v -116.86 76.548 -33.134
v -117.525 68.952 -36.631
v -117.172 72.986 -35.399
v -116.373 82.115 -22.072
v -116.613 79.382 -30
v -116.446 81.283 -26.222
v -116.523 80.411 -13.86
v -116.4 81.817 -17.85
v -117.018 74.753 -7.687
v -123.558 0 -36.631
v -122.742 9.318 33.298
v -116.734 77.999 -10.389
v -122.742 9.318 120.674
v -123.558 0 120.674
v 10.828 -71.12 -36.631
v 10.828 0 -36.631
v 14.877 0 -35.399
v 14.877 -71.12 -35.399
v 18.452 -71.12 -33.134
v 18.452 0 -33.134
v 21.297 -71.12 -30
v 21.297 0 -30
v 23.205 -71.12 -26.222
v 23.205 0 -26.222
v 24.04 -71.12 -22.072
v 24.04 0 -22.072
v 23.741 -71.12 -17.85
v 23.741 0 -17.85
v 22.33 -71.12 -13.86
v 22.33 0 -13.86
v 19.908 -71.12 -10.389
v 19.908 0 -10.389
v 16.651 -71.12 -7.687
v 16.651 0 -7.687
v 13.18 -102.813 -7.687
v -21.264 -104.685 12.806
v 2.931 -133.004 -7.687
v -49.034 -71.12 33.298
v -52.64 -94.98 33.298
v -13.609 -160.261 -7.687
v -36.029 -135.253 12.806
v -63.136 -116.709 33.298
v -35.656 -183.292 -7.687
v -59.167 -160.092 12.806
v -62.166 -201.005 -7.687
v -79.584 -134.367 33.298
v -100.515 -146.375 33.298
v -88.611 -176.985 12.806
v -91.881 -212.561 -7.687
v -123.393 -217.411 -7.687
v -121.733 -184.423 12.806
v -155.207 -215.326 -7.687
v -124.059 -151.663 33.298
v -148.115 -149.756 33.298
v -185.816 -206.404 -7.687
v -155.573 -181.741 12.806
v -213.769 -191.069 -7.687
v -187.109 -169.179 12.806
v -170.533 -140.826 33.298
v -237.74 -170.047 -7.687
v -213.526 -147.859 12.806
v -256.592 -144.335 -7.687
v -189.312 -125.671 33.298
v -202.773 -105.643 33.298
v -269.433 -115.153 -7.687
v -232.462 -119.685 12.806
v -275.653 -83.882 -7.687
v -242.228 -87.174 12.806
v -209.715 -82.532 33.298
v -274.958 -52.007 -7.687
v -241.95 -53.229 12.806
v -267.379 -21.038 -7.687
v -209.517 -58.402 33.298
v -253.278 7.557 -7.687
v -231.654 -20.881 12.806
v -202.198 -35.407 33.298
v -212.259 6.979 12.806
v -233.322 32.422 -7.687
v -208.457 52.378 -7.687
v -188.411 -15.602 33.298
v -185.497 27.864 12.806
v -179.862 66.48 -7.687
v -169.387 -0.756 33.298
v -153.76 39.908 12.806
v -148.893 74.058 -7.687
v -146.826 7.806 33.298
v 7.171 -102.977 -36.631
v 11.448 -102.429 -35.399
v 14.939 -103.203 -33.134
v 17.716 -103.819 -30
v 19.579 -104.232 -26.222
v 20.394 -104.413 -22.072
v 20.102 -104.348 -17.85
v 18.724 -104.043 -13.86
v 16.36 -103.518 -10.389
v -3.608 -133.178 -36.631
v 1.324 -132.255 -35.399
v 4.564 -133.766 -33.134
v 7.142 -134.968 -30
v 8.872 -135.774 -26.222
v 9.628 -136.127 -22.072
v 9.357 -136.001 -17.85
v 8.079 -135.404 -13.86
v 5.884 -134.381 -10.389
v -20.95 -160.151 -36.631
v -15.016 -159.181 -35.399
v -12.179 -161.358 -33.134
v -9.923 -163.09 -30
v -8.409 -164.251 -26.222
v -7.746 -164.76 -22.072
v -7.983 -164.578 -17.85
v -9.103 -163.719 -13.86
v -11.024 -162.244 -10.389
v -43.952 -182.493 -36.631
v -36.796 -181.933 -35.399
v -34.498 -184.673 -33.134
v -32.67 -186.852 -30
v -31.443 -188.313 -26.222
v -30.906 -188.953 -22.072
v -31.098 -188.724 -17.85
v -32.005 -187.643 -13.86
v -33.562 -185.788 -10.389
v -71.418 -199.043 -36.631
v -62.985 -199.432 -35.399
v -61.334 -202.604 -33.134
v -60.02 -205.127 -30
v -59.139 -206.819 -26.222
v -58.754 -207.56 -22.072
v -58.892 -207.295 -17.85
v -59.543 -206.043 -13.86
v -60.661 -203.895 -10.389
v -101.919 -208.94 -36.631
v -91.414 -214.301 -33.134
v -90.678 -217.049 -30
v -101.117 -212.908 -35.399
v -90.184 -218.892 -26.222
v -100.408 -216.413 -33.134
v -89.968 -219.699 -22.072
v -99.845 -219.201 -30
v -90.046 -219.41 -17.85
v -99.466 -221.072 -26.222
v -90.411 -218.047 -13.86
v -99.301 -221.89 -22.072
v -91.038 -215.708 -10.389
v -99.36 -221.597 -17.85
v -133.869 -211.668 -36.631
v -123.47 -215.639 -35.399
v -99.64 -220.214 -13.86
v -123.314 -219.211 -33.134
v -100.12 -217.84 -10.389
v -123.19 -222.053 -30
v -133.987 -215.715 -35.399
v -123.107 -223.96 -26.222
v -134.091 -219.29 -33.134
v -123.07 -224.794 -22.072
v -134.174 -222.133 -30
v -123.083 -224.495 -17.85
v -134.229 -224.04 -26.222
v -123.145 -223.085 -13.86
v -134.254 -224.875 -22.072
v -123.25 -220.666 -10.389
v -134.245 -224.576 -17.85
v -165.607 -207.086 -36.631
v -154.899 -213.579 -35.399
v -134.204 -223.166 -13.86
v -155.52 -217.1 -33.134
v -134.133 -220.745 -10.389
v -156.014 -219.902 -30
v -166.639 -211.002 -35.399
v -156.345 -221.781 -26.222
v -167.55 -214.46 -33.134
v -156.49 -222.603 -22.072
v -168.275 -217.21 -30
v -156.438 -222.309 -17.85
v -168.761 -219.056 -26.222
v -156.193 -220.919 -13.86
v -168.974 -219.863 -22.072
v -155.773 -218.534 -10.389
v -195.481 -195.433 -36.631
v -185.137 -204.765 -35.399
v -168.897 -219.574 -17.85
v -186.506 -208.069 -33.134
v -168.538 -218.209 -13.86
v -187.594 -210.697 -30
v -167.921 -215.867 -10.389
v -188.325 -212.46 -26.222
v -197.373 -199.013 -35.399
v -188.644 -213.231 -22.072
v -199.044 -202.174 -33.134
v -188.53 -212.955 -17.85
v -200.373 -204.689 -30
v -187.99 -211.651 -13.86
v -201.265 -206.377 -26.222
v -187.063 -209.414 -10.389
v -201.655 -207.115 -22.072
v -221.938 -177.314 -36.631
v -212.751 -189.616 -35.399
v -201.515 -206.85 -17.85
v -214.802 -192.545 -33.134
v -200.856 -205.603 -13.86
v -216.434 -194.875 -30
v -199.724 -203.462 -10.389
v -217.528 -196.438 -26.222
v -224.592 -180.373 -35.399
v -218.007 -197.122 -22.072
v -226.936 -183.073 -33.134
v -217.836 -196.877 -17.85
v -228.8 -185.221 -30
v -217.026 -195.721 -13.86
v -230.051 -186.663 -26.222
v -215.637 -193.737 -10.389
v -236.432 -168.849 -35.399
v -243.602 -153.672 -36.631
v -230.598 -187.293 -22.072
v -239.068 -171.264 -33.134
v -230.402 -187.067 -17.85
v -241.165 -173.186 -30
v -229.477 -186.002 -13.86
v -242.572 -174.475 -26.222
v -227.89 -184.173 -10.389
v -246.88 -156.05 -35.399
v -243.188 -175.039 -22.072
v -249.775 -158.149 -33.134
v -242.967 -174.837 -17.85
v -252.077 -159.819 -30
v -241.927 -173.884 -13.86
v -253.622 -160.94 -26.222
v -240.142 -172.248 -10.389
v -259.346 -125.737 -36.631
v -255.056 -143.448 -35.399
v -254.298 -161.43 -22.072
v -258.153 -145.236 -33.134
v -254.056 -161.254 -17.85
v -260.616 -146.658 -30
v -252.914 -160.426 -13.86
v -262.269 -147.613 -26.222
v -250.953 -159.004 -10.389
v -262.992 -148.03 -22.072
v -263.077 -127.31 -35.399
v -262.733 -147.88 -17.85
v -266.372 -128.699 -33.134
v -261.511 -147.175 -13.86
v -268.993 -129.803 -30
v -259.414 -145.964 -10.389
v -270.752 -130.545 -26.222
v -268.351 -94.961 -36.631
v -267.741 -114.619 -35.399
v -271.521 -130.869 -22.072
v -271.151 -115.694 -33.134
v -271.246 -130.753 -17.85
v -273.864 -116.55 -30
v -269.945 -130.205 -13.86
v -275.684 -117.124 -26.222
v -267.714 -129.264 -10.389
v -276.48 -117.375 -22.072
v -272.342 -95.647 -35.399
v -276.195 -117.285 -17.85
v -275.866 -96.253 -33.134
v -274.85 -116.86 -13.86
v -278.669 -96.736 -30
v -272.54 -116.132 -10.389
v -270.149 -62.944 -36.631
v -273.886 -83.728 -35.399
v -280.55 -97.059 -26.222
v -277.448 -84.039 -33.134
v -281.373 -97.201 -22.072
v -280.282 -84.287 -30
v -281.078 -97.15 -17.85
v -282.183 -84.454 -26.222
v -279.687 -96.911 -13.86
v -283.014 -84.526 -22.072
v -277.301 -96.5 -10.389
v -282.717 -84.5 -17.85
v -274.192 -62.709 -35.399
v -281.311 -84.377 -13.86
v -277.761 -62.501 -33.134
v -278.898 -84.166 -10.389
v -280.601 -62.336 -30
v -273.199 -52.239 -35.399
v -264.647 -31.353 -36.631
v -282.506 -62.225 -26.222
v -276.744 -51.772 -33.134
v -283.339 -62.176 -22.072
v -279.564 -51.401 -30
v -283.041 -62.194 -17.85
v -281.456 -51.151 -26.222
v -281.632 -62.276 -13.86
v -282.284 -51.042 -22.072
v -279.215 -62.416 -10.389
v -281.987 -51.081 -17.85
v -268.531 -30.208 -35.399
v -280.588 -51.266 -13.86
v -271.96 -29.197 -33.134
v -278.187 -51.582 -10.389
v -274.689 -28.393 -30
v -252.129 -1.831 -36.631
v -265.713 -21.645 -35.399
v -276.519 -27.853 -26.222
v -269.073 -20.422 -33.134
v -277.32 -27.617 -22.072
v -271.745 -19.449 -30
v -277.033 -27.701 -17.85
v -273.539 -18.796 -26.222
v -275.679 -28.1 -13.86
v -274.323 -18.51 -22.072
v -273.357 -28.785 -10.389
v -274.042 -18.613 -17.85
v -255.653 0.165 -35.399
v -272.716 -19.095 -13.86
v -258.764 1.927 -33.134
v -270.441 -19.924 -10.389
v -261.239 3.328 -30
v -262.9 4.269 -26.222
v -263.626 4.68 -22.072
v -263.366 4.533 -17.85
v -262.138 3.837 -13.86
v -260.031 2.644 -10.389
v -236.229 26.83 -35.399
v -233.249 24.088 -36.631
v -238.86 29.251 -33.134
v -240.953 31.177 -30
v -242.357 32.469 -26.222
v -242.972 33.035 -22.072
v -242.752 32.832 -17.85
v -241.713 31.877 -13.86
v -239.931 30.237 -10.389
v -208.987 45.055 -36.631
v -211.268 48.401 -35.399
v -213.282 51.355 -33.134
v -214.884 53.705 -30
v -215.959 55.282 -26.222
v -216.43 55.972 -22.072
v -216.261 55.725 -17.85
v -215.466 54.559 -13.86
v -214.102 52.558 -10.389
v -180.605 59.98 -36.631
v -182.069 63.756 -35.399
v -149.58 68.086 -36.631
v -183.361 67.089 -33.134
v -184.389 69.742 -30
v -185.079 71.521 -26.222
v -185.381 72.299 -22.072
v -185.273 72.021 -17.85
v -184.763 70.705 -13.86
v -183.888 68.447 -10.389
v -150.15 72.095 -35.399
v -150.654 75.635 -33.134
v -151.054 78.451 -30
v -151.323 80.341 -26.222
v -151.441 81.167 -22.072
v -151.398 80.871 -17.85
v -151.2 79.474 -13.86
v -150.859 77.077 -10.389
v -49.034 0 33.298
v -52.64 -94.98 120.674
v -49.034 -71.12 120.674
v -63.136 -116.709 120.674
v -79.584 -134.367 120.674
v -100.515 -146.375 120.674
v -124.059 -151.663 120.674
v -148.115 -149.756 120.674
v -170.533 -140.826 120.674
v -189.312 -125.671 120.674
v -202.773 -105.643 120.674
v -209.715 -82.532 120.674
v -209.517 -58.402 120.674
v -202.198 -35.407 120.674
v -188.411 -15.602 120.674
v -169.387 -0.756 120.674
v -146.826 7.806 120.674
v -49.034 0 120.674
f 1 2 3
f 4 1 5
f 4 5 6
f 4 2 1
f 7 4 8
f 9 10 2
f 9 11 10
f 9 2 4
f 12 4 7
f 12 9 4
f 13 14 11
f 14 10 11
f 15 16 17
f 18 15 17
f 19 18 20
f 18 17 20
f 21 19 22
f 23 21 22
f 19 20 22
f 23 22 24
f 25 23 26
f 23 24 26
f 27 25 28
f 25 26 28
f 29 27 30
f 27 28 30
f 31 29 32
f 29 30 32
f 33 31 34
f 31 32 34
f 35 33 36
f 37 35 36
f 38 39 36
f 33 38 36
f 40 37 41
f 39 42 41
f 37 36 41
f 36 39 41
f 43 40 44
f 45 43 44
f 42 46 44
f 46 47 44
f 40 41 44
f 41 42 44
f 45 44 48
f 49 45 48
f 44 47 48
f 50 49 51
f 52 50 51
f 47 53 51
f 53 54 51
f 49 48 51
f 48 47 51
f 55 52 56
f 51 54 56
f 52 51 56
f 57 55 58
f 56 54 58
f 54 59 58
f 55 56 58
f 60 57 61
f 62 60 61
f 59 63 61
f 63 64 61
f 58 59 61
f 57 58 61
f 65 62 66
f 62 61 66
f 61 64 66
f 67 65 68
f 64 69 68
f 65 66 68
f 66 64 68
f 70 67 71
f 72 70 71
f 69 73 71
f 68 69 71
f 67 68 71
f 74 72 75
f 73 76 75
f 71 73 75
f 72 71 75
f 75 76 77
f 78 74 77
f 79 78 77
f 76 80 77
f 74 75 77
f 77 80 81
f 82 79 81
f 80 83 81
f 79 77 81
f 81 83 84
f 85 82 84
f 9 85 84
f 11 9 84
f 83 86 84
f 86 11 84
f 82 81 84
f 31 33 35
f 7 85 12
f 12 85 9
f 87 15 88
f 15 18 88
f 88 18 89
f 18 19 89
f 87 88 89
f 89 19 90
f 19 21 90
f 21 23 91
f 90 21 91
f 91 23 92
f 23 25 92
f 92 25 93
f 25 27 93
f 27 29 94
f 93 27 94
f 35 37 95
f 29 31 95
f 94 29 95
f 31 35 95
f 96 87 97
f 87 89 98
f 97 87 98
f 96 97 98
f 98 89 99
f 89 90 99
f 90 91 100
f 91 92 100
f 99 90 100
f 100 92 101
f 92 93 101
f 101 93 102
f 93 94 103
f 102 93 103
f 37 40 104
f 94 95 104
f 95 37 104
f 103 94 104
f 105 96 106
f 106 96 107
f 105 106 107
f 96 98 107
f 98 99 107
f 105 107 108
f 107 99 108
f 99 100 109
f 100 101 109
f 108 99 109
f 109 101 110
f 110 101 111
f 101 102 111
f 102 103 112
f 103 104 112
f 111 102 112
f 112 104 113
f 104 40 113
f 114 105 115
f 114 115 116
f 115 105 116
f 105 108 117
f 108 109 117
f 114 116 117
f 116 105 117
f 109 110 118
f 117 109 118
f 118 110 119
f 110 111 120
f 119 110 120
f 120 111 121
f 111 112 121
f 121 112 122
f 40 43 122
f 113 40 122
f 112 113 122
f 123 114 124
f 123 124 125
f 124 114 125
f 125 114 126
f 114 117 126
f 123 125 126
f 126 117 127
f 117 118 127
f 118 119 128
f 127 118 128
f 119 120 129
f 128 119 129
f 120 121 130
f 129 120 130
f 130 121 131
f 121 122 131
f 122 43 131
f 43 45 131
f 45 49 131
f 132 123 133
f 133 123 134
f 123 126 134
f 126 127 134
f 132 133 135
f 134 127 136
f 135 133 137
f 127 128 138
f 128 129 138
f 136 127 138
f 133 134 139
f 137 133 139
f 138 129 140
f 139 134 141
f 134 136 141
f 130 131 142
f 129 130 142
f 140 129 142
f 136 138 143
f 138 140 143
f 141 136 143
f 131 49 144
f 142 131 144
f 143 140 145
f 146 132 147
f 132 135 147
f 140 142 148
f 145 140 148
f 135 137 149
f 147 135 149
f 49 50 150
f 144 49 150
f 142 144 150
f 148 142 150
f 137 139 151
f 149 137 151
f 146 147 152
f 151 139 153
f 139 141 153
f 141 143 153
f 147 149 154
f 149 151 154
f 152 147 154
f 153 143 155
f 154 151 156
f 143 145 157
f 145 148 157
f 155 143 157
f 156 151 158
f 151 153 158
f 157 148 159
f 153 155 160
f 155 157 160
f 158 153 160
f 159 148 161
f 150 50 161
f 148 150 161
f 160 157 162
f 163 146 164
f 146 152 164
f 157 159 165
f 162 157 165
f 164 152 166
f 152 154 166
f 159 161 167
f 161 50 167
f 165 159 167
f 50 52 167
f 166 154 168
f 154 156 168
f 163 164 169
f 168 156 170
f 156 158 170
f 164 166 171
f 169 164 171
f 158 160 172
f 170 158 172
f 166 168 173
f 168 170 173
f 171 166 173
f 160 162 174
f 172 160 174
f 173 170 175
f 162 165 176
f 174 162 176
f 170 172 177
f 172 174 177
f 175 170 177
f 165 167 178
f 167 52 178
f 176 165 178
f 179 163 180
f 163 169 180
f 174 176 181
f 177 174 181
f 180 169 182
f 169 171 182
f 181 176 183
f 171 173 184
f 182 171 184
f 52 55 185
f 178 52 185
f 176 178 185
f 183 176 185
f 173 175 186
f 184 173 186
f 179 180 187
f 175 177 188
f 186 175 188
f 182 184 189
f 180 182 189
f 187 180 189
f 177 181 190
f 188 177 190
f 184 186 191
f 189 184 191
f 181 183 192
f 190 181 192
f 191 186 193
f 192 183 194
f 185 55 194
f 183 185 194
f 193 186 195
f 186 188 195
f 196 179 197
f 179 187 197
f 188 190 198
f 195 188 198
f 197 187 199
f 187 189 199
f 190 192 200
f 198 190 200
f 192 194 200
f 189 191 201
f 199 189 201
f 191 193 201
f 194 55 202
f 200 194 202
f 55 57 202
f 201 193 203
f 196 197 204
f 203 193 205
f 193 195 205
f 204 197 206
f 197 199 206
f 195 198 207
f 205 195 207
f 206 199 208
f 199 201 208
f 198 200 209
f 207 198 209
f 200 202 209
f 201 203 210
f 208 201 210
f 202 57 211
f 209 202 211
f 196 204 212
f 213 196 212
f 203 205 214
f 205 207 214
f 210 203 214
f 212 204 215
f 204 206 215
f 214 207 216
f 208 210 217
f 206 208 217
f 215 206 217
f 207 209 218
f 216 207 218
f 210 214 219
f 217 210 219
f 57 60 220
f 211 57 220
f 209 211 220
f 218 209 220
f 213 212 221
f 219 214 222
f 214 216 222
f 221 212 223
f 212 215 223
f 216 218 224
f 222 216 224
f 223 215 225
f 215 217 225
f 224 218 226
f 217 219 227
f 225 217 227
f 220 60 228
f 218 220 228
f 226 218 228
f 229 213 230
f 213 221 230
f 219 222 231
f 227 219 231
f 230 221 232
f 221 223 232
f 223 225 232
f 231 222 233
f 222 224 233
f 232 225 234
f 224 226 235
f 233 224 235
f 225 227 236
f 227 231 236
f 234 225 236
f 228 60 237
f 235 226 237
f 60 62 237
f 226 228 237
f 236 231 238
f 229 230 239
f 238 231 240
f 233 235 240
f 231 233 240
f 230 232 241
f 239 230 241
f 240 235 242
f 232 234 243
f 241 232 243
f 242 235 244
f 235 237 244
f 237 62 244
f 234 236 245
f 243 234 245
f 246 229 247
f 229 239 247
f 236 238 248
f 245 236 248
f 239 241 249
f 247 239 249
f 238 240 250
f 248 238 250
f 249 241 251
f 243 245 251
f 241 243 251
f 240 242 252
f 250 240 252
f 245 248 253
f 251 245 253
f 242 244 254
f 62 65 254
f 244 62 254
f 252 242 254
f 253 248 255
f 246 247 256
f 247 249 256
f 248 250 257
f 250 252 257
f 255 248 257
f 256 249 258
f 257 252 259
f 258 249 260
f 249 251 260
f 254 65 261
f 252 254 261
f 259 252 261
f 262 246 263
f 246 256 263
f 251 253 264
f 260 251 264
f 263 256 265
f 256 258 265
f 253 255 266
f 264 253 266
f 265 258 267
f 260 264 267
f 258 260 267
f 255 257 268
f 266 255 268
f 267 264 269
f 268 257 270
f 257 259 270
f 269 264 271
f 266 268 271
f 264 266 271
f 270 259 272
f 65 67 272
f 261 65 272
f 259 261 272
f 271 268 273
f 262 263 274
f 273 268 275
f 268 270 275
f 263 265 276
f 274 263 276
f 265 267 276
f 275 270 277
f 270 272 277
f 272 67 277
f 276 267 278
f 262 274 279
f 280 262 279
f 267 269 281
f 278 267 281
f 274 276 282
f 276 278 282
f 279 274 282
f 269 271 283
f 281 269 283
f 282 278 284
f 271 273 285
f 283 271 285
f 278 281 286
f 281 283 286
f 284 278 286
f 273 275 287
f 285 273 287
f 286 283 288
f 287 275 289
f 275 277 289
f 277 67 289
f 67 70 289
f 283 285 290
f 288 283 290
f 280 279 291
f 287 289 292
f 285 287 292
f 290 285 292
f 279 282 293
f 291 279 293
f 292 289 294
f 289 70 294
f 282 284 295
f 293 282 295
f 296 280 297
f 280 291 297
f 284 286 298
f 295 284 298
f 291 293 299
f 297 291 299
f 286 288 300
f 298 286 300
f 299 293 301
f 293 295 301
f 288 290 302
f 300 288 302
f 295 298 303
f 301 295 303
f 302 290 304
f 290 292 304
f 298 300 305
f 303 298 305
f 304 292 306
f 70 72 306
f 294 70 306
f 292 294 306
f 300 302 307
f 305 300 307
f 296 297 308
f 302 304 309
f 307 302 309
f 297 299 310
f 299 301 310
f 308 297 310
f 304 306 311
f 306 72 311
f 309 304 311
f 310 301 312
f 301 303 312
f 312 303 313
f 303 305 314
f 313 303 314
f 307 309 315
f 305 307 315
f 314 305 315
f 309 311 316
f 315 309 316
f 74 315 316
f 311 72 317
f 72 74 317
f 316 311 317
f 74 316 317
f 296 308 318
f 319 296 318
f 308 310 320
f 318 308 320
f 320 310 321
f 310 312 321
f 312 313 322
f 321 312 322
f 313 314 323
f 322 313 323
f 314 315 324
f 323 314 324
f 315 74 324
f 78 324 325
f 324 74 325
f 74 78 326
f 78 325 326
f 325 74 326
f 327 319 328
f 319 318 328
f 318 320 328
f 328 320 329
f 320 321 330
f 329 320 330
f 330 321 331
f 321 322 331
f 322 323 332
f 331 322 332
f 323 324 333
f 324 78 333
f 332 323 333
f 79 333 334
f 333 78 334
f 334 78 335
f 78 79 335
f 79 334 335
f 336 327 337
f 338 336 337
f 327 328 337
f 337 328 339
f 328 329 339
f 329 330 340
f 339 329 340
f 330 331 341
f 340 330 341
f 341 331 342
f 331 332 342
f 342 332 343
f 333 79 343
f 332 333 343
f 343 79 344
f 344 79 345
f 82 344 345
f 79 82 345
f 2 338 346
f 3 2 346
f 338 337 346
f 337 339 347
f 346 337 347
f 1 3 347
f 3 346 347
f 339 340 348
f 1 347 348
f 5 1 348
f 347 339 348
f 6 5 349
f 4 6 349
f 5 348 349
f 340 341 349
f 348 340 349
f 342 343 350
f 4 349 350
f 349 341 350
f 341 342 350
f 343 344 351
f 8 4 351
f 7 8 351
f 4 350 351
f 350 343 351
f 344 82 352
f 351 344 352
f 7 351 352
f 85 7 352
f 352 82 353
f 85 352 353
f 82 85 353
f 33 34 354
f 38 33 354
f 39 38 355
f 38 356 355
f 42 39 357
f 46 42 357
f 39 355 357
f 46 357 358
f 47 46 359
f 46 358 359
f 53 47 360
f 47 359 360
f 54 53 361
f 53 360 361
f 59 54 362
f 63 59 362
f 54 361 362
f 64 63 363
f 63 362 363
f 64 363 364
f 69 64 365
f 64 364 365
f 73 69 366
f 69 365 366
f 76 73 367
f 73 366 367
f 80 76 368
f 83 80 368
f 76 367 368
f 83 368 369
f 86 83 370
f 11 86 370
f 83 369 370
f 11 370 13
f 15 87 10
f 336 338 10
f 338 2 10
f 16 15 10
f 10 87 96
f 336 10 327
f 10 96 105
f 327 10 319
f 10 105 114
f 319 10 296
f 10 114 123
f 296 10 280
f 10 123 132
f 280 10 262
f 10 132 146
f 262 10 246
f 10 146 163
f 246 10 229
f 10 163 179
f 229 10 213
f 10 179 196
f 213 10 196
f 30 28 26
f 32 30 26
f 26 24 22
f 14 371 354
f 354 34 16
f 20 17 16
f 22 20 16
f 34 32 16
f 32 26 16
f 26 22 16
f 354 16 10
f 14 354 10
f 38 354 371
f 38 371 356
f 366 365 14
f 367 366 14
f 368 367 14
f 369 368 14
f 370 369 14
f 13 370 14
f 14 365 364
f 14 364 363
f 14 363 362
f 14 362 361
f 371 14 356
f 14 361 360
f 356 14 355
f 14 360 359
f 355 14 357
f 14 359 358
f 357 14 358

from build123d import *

# Parameters (mm, degrees)
F1_DEPTH = 71.12
F2_DEPTH = 87.376
F3_ANGLE = 275


with BuildPart() as f1:
    # F0 (on Front) → F1 (new body)
    with BuildSketch(Plane.XZ):
        with BuildLine():
            Line((-129.7797858715, 33.2981981337), (-129.7797858715, -36.6309396923))
            Line((-129.7797858715, -36.6309396923), (10.8276167884, -36.6309396923))
            ThreePointArc((10.8276167884, -36.6309396923), (23.7625826148, -24.1752902471), (16.6507605463, -7.686550729))
            Line((16.6507605463, -7.686550729), (-49.0343049169, 33.2981981337))
            Line((-49.0343049169, 33.2981981337), (-129.7797858715, 33.2981981337))
        make_face()
    extrude(amount=F1_DEPTH)

    # F2 (add): a face of the model
    f2_faces = [f1.faces().sort_by_distance(p)[0] for p in [
        (-89.4070453942, -35.56, 33.2981981337),
    ]]
    extrude(f2_faces, amount=F2_DEPTH)

    # F2_face (on face) → F3 (revolve)
    with BuildSketch(Plane(origin=(-74.6235346517, -71.12, 30.893227171), x_dir=(1, 0, 0), z_dir=(0, -1, 0))):
        with BuildLine():
            Line((91.274295198, -38.5797779), (25.5892297349, 2.4049709627))
            Line((25.5892297349, 2.4049709627), (25.5892297349, 89.7809709627))
            Line((25.5892297349, 89.7809709627), (-55.1562512198, 89.7809709627))
            Line((-55.1562512198, 89.7809709627), (-55.1562512198, -67.5241668633))
            Line((-55.1562512198, -67.5241668633), (85.4511514402, -67.5241668633))
            ThreePointArc((85.4511514402, -67.5241668633), (98.3861172665, -55.0685174181), (91.274295198, -38.5797779))
        make_face()
    revolve(axis=Axis((-129.7797858715, -71.12, 42.0216292207), (0, 0, -1)), revolution_arc=F3_ANGLE)


solid = f1.part
